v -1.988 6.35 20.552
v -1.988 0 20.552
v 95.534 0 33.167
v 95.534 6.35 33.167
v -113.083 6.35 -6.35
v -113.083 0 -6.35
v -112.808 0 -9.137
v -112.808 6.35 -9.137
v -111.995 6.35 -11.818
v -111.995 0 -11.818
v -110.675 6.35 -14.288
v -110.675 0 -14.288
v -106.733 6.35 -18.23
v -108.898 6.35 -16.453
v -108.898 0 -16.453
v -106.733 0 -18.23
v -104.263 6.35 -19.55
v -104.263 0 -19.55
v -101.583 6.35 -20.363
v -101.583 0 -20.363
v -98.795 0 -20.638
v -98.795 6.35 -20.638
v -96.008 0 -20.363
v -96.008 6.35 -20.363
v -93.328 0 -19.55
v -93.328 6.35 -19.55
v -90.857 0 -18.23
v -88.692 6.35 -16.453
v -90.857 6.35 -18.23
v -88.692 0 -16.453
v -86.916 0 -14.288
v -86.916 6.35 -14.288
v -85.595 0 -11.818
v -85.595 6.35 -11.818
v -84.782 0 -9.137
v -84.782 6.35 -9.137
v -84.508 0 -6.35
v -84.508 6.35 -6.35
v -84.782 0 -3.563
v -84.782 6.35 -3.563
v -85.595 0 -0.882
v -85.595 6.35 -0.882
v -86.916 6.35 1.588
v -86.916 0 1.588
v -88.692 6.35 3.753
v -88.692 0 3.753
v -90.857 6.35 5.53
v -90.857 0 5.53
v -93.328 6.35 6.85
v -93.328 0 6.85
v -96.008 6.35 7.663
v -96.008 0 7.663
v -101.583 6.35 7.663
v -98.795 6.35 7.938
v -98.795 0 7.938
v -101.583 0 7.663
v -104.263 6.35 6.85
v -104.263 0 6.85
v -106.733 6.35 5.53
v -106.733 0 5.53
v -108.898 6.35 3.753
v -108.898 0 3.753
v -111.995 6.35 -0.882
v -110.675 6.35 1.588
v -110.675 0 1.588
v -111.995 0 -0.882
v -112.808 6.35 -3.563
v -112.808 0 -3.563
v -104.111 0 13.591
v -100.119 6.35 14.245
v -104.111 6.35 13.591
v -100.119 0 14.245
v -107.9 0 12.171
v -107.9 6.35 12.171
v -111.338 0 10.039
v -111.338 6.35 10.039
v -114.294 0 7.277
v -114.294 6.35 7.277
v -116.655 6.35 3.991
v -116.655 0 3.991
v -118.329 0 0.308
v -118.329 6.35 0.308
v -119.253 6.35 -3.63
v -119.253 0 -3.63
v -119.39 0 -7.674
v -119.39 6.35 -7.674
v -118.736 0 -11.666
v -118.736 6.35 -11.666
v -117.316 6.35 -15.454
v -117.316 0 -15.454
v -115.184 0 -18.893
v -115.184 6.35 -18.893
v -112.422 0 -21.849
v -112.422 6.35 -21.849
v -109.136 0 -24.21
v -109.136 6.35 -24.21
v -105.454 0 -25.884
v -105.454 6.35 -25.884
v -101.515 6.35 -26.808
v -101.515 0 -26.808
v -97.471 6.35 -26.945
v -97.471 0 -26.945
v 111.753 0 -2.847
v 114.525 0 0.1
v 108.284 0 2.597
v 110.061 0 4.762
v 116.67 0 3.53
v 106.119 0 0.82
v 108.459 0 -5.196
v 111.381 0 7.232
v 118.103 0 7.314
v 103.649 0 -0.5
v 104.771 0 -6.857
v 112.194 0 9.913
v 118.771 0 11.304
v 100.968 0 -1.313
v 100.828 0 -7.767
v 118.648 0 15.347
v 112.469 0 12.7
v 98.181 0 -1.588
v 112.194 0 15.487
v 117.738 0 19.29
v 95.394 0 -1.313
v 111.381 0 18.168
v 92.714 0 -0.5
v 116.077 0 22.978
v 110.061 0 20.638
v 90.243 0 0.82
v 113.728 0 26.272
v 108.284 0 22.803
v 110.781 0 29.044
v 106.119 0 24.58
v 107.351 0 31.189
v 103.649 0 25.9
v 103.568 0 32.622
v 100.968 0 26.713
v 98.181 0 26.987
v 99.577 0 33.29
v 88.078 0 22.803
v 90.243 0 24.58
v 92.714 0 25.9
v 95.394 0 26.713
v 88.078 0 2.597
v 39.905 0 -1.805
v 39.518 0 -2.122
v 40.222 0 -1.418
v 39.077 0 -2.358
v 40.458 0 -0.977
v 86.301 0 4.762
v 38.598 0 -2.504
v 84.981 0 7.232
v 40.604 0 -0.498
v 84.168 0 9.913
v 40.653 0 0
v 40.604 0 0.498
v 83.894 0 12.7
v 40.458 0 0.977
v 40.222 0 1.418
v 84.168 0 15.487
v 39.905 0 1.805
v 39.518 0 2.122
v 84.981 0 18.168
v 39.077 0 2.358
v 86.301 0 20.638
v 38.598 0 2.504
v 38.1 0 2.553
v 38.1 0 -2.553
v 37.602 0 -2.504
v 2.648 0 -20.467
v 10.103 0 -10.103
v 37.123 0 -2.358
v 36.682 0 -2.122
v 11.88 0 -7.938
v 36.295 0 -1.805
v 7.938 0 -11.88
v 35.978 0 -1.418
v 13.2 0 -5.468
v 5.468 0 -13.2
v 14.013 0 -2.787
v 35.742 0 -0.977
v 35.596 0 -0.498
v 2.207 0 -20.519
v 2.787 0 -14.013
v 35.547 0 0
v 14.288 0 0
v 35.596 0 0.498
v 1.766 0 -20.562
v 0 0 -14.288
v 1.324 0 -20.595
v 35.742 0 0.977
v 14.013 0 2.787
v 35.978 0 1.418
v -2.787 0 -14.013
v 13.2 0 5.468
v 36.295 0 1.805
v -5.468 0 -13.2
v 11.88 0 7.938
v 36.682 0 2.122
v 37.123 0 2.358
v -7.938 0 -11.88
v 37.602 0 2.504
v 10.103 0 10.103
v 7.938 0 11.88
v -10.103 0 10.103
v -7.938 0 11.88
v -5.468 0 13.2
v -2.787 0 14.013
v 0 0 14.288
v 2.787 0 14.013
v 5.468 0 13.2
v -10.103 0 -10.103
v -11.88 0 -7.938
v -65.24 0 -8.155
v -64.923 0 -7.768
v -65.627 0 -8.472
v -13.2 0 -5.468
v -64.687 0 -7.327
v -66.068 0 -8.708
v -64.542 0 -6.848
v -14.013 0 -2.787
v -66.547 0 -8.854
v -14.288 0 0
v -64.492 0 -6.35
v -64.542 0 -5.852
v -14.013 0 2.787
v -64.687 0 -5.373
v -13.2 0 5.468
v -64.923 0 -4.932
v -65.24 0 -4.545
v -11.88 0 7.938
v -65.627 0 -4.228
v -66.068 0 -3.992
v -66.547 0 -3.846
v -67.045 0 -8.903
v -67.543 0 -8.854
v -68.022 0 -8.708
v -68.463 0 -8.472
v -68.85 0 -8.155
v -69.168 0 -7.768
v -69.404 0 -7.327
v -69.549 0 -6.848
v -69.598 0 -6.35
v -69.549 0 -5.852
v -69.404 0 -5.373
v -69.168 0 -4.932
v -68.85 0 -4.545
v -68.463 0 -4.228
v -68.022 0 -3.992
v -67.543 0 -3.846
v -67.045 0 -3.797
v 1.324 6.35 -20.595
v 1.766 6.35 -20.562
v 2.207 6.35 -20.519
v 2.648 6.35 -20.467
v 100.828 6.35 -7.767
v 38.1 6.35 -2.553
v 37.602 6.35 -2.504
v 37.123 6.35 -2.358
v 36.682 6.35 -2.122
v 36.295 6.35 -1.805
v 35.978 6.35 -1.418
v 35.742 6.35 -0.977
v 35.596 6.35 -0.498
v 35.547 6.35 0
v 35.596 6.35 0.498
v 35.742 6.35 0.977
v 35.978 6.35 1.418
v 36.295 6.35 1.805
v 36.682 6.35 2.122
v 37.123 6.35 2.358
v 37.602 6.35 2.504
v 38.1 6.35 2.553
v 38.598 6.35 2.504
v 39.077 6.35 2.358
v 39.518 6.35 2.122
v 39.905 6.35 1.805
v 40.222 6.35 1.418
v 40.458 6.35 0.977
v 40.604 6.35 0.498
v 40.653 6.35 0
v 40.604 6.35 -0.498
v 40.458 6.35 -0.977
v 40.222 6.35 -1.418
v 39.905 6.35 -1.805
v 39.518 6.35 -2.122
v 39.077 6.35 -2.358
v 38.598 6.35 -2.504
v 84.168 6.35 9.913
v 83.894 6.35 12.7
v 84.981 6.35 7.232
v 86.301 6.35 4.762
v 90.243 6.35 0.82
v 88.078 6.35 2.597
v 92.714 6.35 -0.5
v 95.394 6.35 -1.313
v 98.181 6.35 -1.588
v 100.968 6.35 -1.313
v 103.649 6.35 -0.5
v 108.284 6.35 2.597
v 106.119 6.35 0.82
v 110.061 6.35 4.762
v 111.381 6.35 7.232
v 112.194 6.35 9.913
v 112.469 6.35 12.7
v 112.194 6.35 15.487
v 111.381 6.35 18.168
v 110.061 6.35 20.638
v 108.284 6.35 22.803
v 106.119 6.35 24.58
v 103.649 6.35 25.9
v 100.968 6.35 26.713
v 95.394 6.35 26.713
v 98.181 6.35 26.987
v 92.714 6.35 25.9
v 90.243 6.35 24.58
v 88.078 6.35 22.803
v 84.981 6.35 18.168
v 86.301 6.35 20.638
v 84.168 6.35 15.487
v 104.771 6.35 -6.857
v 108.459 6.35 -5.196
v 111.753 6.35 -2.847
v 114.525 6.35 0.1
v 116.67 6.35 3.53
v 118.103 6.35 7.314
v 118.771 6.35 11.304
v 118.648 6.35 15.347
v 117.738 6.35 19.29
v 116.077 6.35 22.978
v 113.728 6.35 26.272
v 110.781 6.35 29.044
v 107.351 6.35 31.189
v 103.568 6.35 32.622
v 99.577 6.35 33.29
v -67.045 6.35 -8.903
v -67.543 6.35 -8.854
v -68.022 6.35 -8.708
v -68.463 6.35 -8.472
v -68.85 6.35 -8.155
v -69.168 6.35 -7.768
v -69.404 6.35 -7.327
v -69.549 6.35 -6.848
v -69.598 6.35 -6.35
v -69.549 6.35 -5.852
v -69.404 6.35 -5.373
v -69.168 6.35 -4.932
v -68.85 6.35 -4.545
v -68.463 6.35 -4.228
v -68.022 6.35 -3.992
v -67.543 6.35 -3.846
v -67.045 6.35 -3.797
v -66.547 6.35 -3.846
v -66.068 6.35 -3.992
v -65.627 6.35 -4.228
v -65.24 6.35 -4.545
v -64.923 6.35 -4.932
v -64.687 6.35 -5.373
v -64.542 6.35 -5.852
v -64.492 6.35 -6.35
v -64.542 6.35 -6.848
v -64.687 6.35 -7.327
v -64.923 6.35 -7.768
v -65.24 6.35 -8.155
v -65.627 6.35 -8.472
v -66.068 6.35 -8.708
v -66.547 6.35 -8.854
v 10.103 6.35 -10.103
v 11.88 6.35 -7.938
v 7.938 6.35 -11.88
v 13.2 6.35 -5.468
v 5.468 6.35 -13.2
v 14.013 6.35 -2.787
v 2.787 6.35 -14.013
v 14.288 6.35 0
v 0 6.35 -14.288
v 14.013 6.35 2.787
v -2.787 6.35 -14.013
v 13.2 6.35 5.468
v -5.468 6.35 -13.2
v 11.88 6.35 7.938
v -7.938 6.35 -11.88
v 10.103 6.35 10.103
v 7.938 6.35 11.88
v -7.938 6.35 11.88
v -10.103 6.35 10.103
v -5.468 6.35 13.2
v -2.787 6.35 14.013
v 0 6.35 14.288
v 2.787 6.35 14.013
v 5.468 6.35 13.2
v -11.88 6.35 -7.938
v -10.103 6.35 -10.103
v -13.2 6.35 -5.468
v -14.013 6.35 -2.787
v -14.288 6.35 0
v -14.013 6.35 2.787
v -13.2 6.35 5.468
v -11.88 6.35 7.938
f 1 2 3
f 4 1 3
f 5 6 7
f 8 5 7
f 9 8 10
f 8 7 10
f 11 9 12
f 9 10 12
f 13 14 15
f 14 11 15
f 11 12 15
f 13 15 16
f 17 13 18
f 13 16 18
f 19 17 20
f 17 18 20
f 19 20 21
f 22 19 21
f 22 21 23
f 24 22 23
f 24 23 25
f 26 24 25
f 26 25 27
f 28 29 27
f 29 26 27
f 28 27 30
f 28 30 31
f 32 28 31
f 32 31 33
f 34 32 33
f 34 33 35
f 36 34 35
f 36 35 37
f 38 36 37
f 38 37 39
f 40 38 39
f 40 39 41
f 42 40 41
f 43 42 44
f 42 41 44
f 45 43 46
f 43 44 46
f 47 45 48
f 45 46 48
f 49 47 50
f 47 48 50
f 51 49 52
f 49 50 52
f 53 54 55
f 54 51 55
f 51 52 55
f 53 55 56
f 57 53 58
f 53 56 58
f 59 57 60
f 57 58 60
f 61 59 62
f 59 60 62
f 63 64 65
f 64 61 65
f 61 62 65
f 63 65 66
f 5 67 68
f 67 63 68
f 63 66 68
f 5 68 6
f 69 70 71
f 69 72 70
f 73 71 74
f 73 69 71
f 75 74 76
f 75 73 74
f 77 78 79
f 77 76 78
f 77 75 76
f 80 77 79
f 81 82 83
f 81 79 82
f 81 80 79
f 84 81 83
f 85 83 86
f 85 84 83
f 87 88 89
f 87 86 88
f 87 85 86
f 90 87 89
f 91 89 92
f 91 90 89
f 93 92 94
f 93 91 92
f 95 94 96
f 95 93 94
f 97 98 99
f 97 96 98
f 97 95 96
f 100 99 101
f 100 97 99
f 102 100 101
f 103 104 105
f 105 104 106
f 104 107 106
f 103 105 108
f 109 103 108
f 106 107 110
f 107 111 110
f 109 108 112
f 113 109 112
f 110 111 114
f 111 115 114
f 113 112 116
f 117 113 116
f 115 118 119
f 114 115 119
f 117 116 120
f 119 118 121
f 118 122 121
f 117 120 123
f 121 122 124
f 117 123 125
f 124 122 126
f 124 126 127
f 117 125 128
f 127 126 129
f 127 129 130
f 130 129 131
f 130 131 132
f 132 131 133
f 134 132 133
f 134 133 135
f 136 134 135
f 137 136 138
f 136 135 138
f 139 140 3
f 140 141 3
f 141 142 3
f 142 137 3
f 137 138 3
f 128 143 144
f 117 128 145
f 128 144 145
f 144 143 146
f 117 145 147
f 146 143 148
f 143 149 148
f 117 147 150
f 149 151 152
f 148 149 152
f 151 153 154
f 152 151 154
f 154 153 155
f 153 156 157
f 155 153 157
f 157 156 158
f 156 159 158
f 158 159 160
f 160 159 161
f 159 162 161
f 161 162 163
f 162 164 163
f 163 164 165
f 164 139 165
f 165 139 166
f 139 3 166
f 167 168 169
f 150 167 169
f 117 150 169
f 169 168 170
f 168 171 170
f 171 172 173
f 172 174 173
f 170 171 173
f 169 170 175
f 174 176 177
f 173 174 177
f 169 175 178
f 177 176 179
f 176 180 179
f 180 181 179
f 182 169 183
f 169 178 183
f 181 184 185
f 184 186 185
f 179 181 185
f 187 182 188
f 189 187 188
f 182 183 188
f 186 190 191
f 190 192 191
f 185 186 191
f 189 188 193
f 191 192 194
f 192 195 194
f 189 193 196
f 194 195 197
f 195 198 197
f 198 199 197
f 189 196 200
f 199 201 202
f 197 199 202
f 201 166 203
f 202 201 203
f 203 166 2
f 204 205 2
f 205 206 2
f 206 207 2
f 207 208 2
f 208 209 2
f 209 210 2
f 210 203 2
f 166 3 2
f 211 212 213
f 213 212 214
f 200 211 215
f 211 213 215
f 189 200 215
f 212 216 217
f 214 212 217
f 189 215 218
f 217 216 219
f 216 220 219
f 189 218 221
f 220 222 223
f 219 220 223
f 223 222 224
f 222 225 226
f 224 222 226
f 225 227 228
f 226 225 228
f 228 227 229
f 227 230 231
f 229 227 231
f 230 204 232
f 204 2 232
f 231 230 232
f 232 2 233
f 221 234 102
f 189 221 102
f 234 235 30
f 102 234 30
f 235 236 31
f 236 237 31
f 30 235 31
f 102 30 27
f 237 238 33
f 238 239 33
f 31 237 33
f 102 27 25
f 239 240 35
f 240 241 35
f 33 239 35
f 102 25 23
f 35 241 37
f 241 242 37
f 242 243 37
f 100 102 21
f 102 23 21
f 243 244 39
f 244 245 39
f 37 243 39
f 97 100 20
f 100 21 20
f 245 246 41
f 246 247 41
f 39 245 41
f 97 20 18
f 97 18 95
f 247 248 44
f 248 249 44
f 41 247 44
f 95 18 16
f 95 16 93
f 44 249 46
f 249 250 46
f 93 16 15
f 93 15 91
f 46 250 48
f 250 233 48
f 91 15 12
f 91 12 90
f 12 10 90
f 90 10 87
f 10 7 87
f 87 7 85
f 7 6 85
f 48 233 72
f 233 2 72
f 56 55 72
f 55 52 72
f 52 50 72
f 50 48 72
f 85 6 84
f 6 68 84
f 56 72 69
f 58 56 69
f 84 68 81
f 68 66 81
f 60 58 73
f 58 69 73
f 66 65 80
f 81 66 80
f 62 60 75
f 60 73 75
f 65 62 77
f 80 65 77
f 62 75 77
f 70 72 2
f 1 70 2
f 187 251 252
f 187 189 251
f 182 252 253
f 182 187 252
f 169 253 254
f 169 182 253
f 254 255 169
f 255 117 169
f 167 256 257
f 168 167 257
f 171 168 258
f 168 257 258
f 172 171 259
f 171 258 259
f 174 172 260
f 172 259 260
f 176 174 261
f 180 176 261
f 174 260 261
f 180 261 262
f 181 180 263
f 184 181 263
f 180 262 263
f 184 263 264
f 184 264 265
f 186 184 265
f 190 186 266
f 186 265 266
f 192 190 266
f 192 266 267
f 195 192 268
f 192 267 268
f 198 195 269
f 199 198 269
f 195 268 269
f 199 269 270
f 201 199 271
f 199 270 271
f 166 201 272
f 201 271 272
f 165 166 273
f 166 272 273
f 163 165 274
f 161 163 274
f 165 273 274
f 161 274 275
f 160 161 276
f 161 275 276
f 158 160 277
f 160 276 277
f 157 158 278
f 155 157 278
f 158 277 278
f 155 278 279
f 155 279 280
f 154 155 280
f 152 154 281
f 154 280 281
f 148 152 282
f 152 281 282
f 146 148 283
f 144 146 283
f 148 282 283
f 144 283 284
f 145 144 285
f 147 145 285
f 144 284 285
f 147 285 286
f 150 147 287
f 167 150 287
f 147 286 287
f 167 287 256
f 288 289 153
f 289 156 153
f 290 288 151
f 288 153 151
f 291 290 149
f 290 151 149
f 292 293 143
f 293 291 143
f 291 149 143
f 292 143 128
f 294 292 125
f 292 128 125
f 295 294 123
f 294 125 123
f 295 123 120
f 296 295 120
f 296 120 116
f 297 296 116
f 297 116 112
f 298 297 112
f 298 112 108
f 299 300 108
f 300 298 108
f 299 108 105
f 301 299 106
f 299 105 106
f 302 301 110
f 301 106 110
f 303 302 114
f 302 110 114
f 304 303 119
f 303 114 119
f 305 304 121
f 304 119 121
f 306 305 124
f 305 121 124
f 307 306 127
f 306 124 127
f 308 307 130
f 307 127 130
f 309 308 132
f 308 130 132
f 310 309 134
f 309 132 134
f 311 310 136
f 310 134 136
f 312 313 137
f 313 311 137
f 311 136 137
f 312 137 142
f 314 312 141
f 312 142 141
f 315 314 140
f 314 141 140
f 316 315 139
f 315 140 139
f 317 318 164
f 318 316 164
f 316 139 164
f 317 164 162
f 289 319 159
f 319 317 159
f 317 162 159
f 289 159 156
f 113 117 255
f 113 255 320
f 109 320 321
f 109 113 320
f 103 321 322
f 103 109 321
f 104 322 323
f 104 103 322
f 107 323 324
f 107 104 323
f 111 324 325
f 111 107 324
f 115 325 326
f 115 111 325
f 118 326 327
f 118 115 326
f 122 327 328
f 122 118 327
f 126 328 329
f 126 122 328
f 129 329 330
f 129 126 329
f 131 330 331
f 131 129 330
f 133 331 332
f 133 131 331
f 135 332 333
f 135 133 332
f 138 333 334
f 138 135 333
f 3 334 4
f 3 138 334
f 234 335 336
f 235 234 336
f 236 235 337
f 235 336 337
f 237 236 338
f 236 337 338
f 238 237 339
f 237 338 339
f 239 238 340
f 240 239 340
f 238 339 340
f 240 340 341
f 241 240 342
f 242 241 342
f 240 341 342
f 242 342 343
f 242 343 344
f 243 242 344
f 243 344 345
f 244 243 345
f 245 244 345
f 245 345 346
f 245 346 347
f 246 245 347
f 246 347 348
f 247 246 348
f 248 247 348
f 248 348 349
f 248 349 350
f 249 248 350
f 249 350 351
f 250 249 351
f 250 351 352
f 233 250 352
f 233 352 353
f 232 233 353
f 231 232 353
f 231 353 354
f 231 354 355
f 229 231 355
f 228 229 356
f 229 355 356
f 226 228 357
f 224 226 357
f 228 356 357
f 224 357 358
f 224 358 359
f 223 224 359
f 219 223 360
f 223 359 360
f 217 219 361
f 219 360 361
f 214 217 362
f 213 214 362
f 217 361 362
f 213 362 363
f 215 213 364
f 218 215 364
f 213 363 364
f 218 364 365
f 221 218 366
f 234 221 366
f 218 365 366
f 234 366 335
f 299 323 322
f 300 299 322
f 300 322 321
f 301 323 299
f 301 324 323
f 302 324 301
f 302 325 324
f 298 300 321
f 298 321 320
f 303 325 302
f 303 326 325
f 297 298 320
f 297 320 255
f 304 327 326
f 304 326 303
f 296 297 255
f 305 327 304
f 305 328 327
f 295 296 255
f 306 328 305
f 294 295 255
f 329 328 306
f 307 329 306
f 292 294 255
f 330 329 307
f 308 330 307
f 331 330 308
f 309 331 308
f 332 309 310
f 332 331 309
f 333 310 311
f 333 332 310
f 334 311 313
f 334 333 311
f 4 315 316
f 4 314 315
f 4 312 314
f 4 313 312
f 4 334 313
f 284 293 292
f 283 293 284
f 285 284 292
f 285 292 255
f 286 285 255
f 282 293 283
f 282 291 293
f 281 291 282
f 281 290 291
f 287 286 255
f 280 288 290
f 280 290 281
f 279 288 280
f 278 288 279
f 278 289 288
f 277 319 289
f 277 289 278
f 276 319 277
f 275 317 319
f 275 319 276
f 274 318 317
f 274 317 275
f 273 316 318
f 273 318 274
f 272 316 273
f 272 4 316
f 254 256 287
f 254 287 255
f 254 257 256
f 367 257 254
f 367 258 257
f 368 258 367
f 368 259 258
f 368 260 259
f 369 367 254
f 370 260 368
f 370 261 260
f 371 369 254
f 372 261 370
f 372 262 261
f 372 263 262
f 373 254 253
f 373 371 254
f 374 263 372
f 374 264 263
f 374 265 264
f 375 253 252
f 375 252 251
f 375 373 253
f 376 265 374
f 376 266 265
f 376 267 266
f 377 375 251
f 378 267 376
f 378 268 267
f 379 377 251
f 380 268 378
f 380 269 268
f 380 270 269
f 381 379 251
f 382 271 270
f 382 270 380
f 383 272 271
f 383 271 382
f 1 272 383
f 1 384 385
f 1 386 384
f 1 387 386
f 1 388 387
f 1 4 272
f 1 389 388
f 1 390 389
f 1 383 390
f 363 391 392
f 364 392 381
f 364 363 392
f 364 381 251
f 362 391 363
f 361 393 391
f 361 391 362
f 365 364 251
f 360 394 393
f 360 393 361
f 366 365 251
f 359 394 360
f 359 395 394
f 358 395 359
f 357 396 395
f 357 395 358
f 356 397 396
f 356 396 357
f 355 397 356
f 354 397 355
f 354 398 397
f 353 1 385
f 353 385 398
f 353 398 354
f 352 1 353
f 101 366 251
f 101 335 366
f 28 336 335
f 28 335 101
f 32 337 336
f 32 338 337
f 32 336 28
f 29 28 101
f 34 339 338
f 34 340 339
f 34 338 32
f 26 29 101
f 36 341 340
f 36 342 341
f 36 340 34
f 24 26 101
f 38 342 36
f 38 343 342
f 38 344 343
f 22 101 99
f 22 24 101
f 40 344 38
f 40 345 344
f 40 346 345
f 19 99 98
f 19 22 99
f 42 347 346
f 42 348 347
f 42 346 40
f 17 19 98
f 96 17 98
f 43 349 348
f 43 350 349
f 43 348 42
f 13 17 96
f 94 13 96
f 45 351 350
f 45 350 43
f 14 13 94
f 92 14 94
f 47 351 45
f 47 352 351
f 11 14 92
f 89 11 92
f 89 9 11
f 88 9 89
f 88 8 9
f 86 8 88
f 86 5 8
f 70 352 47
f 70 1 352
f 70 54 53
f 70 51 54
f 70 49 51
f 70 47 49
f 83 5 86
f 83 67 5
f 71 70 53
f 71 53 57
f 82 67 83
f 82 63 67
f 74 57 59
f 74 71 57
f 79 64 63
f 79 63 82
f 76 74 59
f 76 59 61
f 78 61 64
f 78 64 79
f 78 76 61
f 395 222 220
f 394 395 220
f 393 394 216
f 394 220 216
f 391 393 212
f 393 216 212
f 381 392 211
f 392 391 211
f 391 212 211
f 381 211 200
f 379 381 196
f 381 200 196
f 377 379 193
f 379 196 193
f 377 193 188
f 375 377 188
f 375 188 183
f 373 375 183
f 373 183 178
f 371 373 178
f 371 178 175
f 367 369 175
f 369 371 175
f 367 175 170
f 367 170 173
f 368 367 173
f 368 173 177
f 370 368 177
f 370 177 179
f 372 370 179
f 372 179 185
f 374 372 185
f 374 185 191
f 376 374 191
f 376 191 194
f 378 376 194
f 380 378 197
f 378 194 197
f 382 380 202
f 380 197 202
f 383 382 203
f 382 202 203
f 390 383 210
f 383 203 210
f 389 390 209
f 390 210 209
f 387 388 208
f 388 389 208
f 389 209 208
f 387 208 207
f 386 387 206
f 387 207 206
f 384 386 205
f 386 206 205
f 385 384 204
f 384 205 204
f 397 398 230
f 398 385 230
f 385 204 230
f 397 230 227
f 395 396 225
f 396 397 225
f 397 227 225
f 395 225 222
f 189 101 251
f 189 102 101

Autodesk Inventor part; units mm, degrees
ref_plane "YZ Plane" through (0, 0, 0) normal (1, 0, 0) x (0, 1, 0)
ref_plane "XZ Plane" through (0, 0, 0) normal (0, 1, 0) x (-1, 0, 0)
ref_plane "XY Plane" through (0, 0, 0) normal (0, 0, 1) x (1, 0, 0)
sketch "Sketch1" plane through (0, 0, 0) normal (0, 1, 0) x (-1, 0, 0)
  circle A0 centre (0, 0) radius 14.2875
  circle A1 centre (-98.1811, 12.7) radius 14.2875
  circle A2 centre (98.7952, -6.35) radius 14.2875
  circle A3 centre (98.7952, -6.35) radius 20.6375 construction
  circle A4 centre (0, 0) radius 20.6375 construction
  circle A5 centre (-98.1811, 12.7) radius 20.6375 construction
  circle A6 centre (67.0452, -6.35) radius 4.7625 construction
  circle A7 centre (-38.1, 0) radius 4.7625 construction
  circle A8 centre (67.0452, -6.35) radius 11.1125 construction
  circle A9 centre (-38.1, 0) radius 11.1125 construction
  line L0 (100.1189, 14.245) -> (1.3237, 20.595)
  line L1 (2.6475, 20.467) -> (-95.5336, 33.167)
  line L2 (-100.8285, -7.767) -> (-2.6475, -20.467)
  line L3 (97.4714, -26.945) -> (-1.3237, -20.595)
  arc A10 (-2.6475, -20.467) -> (-1.3237, -20.595) centre (0, 0) ccw
  arc A11 (97.4714, -26.945) -> (100.1189, 14.245) centre (98.7952, -6.35) ccw
  arc A12 (-95.5336, 33.167) -> (-100.8285, -7.767) centre (-98.1811, 12.7) ccw
  point P0 (1.9877, 20.5523)
  dimension "d0" = 28.575
  dimension "d1" = 98.999
  dimension "d2" = 98.999
  dimension "d3" = 12.7
  dimension "d4" = 6.35
  dimension "d5" = 6.35
  dimension "d6" = 6.35
  dimension "d7" = 6.35
  dimension "d8" = 31.75
  dimension "d9" = 38.1
  dimension "d10" = 9.525
  dimension "d11" = 6.35
extrude "Extrusion1" add sketch "Sketch1" along normal blind 6.35
hole "Hole1" at (38.1, 0, 0) at (-67.0452, 0, -6.35) direction (0, 1, 0) diameter 5.1054 end through all clearance for "Flat Head Machine Screw (82)" size "#10" standard "Ansi Unified Screw Threads"
equation "\"d2\" = d1"
properties part number "GP3-004" material "Aluminum 6061"
